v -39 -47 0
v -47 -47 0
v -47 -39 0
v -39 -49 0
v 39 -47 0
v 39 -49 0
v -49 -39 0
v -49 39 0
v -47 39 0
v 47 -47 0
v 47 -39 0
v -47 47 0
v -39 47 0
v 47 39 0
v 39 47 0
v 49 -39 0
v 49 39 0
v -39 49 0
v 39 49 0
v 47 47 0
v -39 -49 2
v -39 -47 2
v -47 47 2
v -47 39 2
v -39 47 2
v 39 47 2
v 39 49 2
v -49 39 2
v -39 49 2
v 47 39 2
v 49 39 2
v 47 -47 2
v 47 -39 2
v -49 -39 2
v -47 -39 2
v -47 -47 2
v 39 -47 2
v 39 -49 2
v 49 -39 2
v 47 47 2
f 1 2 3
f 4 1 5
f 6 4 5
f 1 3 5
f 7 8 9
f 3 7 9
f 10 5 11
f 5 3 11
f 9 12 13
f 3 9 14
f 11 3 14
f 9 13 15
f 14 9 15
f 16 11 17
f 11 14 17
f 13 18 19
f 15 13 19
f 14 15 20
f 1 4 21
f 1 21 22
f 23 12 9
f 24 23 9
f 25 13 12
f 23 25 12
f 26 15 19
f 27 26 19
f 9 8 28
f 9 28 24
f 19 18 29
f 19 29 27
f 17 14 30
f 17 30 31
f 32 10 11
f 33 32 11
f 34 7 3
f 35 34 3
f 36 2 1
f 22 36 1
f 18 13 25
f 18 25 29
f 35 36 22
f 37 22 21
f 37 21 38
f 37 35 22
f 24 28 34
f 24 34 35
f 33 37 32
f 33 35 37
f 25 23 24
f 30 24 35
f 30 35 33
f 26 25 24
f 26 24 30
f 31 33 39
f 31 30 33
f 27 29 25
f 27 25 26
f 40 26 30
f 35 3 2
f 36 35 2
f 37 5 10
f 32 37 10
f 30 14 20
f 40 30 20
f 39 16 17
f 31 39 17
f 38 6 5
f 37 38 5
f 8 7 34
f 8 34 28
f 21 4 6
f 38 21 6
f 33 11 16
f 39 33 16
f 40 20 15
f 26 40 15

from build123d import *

# Parameters (mm, degrees)
F0_W     = 78
F0_H     = 2
F0_W_2   = 2
F0_H_2   = 78
F1_DEPTH = 2


with BuildPart() as f1:
    # F0 (on Top) → F1 (new body)
    with BuildSketch(Plane.XY):
        with Locations((0, 48)):
            Rectangle(F0_W, F0_H)
        Polygon((47, 47), (39, 47), (-39, 47), (-47, 47), (-47, 39), (-47, -39), (-47, -47), (-39, -47), (39, -47), (47, -47), (47, -39), (47, 39), align=None)
        with Locations((48, 0)):
            Rectangle(F0_W_2, F0_H_2)
        with Locations((-48, 0)):
            Rectangle(F0_W_2, F0_H_2)
        with Locations((0, -48)):
            Rectangle(F0_W, F0_H)
    extrude(amount=F1_DEPTH)


solid = f1.part
